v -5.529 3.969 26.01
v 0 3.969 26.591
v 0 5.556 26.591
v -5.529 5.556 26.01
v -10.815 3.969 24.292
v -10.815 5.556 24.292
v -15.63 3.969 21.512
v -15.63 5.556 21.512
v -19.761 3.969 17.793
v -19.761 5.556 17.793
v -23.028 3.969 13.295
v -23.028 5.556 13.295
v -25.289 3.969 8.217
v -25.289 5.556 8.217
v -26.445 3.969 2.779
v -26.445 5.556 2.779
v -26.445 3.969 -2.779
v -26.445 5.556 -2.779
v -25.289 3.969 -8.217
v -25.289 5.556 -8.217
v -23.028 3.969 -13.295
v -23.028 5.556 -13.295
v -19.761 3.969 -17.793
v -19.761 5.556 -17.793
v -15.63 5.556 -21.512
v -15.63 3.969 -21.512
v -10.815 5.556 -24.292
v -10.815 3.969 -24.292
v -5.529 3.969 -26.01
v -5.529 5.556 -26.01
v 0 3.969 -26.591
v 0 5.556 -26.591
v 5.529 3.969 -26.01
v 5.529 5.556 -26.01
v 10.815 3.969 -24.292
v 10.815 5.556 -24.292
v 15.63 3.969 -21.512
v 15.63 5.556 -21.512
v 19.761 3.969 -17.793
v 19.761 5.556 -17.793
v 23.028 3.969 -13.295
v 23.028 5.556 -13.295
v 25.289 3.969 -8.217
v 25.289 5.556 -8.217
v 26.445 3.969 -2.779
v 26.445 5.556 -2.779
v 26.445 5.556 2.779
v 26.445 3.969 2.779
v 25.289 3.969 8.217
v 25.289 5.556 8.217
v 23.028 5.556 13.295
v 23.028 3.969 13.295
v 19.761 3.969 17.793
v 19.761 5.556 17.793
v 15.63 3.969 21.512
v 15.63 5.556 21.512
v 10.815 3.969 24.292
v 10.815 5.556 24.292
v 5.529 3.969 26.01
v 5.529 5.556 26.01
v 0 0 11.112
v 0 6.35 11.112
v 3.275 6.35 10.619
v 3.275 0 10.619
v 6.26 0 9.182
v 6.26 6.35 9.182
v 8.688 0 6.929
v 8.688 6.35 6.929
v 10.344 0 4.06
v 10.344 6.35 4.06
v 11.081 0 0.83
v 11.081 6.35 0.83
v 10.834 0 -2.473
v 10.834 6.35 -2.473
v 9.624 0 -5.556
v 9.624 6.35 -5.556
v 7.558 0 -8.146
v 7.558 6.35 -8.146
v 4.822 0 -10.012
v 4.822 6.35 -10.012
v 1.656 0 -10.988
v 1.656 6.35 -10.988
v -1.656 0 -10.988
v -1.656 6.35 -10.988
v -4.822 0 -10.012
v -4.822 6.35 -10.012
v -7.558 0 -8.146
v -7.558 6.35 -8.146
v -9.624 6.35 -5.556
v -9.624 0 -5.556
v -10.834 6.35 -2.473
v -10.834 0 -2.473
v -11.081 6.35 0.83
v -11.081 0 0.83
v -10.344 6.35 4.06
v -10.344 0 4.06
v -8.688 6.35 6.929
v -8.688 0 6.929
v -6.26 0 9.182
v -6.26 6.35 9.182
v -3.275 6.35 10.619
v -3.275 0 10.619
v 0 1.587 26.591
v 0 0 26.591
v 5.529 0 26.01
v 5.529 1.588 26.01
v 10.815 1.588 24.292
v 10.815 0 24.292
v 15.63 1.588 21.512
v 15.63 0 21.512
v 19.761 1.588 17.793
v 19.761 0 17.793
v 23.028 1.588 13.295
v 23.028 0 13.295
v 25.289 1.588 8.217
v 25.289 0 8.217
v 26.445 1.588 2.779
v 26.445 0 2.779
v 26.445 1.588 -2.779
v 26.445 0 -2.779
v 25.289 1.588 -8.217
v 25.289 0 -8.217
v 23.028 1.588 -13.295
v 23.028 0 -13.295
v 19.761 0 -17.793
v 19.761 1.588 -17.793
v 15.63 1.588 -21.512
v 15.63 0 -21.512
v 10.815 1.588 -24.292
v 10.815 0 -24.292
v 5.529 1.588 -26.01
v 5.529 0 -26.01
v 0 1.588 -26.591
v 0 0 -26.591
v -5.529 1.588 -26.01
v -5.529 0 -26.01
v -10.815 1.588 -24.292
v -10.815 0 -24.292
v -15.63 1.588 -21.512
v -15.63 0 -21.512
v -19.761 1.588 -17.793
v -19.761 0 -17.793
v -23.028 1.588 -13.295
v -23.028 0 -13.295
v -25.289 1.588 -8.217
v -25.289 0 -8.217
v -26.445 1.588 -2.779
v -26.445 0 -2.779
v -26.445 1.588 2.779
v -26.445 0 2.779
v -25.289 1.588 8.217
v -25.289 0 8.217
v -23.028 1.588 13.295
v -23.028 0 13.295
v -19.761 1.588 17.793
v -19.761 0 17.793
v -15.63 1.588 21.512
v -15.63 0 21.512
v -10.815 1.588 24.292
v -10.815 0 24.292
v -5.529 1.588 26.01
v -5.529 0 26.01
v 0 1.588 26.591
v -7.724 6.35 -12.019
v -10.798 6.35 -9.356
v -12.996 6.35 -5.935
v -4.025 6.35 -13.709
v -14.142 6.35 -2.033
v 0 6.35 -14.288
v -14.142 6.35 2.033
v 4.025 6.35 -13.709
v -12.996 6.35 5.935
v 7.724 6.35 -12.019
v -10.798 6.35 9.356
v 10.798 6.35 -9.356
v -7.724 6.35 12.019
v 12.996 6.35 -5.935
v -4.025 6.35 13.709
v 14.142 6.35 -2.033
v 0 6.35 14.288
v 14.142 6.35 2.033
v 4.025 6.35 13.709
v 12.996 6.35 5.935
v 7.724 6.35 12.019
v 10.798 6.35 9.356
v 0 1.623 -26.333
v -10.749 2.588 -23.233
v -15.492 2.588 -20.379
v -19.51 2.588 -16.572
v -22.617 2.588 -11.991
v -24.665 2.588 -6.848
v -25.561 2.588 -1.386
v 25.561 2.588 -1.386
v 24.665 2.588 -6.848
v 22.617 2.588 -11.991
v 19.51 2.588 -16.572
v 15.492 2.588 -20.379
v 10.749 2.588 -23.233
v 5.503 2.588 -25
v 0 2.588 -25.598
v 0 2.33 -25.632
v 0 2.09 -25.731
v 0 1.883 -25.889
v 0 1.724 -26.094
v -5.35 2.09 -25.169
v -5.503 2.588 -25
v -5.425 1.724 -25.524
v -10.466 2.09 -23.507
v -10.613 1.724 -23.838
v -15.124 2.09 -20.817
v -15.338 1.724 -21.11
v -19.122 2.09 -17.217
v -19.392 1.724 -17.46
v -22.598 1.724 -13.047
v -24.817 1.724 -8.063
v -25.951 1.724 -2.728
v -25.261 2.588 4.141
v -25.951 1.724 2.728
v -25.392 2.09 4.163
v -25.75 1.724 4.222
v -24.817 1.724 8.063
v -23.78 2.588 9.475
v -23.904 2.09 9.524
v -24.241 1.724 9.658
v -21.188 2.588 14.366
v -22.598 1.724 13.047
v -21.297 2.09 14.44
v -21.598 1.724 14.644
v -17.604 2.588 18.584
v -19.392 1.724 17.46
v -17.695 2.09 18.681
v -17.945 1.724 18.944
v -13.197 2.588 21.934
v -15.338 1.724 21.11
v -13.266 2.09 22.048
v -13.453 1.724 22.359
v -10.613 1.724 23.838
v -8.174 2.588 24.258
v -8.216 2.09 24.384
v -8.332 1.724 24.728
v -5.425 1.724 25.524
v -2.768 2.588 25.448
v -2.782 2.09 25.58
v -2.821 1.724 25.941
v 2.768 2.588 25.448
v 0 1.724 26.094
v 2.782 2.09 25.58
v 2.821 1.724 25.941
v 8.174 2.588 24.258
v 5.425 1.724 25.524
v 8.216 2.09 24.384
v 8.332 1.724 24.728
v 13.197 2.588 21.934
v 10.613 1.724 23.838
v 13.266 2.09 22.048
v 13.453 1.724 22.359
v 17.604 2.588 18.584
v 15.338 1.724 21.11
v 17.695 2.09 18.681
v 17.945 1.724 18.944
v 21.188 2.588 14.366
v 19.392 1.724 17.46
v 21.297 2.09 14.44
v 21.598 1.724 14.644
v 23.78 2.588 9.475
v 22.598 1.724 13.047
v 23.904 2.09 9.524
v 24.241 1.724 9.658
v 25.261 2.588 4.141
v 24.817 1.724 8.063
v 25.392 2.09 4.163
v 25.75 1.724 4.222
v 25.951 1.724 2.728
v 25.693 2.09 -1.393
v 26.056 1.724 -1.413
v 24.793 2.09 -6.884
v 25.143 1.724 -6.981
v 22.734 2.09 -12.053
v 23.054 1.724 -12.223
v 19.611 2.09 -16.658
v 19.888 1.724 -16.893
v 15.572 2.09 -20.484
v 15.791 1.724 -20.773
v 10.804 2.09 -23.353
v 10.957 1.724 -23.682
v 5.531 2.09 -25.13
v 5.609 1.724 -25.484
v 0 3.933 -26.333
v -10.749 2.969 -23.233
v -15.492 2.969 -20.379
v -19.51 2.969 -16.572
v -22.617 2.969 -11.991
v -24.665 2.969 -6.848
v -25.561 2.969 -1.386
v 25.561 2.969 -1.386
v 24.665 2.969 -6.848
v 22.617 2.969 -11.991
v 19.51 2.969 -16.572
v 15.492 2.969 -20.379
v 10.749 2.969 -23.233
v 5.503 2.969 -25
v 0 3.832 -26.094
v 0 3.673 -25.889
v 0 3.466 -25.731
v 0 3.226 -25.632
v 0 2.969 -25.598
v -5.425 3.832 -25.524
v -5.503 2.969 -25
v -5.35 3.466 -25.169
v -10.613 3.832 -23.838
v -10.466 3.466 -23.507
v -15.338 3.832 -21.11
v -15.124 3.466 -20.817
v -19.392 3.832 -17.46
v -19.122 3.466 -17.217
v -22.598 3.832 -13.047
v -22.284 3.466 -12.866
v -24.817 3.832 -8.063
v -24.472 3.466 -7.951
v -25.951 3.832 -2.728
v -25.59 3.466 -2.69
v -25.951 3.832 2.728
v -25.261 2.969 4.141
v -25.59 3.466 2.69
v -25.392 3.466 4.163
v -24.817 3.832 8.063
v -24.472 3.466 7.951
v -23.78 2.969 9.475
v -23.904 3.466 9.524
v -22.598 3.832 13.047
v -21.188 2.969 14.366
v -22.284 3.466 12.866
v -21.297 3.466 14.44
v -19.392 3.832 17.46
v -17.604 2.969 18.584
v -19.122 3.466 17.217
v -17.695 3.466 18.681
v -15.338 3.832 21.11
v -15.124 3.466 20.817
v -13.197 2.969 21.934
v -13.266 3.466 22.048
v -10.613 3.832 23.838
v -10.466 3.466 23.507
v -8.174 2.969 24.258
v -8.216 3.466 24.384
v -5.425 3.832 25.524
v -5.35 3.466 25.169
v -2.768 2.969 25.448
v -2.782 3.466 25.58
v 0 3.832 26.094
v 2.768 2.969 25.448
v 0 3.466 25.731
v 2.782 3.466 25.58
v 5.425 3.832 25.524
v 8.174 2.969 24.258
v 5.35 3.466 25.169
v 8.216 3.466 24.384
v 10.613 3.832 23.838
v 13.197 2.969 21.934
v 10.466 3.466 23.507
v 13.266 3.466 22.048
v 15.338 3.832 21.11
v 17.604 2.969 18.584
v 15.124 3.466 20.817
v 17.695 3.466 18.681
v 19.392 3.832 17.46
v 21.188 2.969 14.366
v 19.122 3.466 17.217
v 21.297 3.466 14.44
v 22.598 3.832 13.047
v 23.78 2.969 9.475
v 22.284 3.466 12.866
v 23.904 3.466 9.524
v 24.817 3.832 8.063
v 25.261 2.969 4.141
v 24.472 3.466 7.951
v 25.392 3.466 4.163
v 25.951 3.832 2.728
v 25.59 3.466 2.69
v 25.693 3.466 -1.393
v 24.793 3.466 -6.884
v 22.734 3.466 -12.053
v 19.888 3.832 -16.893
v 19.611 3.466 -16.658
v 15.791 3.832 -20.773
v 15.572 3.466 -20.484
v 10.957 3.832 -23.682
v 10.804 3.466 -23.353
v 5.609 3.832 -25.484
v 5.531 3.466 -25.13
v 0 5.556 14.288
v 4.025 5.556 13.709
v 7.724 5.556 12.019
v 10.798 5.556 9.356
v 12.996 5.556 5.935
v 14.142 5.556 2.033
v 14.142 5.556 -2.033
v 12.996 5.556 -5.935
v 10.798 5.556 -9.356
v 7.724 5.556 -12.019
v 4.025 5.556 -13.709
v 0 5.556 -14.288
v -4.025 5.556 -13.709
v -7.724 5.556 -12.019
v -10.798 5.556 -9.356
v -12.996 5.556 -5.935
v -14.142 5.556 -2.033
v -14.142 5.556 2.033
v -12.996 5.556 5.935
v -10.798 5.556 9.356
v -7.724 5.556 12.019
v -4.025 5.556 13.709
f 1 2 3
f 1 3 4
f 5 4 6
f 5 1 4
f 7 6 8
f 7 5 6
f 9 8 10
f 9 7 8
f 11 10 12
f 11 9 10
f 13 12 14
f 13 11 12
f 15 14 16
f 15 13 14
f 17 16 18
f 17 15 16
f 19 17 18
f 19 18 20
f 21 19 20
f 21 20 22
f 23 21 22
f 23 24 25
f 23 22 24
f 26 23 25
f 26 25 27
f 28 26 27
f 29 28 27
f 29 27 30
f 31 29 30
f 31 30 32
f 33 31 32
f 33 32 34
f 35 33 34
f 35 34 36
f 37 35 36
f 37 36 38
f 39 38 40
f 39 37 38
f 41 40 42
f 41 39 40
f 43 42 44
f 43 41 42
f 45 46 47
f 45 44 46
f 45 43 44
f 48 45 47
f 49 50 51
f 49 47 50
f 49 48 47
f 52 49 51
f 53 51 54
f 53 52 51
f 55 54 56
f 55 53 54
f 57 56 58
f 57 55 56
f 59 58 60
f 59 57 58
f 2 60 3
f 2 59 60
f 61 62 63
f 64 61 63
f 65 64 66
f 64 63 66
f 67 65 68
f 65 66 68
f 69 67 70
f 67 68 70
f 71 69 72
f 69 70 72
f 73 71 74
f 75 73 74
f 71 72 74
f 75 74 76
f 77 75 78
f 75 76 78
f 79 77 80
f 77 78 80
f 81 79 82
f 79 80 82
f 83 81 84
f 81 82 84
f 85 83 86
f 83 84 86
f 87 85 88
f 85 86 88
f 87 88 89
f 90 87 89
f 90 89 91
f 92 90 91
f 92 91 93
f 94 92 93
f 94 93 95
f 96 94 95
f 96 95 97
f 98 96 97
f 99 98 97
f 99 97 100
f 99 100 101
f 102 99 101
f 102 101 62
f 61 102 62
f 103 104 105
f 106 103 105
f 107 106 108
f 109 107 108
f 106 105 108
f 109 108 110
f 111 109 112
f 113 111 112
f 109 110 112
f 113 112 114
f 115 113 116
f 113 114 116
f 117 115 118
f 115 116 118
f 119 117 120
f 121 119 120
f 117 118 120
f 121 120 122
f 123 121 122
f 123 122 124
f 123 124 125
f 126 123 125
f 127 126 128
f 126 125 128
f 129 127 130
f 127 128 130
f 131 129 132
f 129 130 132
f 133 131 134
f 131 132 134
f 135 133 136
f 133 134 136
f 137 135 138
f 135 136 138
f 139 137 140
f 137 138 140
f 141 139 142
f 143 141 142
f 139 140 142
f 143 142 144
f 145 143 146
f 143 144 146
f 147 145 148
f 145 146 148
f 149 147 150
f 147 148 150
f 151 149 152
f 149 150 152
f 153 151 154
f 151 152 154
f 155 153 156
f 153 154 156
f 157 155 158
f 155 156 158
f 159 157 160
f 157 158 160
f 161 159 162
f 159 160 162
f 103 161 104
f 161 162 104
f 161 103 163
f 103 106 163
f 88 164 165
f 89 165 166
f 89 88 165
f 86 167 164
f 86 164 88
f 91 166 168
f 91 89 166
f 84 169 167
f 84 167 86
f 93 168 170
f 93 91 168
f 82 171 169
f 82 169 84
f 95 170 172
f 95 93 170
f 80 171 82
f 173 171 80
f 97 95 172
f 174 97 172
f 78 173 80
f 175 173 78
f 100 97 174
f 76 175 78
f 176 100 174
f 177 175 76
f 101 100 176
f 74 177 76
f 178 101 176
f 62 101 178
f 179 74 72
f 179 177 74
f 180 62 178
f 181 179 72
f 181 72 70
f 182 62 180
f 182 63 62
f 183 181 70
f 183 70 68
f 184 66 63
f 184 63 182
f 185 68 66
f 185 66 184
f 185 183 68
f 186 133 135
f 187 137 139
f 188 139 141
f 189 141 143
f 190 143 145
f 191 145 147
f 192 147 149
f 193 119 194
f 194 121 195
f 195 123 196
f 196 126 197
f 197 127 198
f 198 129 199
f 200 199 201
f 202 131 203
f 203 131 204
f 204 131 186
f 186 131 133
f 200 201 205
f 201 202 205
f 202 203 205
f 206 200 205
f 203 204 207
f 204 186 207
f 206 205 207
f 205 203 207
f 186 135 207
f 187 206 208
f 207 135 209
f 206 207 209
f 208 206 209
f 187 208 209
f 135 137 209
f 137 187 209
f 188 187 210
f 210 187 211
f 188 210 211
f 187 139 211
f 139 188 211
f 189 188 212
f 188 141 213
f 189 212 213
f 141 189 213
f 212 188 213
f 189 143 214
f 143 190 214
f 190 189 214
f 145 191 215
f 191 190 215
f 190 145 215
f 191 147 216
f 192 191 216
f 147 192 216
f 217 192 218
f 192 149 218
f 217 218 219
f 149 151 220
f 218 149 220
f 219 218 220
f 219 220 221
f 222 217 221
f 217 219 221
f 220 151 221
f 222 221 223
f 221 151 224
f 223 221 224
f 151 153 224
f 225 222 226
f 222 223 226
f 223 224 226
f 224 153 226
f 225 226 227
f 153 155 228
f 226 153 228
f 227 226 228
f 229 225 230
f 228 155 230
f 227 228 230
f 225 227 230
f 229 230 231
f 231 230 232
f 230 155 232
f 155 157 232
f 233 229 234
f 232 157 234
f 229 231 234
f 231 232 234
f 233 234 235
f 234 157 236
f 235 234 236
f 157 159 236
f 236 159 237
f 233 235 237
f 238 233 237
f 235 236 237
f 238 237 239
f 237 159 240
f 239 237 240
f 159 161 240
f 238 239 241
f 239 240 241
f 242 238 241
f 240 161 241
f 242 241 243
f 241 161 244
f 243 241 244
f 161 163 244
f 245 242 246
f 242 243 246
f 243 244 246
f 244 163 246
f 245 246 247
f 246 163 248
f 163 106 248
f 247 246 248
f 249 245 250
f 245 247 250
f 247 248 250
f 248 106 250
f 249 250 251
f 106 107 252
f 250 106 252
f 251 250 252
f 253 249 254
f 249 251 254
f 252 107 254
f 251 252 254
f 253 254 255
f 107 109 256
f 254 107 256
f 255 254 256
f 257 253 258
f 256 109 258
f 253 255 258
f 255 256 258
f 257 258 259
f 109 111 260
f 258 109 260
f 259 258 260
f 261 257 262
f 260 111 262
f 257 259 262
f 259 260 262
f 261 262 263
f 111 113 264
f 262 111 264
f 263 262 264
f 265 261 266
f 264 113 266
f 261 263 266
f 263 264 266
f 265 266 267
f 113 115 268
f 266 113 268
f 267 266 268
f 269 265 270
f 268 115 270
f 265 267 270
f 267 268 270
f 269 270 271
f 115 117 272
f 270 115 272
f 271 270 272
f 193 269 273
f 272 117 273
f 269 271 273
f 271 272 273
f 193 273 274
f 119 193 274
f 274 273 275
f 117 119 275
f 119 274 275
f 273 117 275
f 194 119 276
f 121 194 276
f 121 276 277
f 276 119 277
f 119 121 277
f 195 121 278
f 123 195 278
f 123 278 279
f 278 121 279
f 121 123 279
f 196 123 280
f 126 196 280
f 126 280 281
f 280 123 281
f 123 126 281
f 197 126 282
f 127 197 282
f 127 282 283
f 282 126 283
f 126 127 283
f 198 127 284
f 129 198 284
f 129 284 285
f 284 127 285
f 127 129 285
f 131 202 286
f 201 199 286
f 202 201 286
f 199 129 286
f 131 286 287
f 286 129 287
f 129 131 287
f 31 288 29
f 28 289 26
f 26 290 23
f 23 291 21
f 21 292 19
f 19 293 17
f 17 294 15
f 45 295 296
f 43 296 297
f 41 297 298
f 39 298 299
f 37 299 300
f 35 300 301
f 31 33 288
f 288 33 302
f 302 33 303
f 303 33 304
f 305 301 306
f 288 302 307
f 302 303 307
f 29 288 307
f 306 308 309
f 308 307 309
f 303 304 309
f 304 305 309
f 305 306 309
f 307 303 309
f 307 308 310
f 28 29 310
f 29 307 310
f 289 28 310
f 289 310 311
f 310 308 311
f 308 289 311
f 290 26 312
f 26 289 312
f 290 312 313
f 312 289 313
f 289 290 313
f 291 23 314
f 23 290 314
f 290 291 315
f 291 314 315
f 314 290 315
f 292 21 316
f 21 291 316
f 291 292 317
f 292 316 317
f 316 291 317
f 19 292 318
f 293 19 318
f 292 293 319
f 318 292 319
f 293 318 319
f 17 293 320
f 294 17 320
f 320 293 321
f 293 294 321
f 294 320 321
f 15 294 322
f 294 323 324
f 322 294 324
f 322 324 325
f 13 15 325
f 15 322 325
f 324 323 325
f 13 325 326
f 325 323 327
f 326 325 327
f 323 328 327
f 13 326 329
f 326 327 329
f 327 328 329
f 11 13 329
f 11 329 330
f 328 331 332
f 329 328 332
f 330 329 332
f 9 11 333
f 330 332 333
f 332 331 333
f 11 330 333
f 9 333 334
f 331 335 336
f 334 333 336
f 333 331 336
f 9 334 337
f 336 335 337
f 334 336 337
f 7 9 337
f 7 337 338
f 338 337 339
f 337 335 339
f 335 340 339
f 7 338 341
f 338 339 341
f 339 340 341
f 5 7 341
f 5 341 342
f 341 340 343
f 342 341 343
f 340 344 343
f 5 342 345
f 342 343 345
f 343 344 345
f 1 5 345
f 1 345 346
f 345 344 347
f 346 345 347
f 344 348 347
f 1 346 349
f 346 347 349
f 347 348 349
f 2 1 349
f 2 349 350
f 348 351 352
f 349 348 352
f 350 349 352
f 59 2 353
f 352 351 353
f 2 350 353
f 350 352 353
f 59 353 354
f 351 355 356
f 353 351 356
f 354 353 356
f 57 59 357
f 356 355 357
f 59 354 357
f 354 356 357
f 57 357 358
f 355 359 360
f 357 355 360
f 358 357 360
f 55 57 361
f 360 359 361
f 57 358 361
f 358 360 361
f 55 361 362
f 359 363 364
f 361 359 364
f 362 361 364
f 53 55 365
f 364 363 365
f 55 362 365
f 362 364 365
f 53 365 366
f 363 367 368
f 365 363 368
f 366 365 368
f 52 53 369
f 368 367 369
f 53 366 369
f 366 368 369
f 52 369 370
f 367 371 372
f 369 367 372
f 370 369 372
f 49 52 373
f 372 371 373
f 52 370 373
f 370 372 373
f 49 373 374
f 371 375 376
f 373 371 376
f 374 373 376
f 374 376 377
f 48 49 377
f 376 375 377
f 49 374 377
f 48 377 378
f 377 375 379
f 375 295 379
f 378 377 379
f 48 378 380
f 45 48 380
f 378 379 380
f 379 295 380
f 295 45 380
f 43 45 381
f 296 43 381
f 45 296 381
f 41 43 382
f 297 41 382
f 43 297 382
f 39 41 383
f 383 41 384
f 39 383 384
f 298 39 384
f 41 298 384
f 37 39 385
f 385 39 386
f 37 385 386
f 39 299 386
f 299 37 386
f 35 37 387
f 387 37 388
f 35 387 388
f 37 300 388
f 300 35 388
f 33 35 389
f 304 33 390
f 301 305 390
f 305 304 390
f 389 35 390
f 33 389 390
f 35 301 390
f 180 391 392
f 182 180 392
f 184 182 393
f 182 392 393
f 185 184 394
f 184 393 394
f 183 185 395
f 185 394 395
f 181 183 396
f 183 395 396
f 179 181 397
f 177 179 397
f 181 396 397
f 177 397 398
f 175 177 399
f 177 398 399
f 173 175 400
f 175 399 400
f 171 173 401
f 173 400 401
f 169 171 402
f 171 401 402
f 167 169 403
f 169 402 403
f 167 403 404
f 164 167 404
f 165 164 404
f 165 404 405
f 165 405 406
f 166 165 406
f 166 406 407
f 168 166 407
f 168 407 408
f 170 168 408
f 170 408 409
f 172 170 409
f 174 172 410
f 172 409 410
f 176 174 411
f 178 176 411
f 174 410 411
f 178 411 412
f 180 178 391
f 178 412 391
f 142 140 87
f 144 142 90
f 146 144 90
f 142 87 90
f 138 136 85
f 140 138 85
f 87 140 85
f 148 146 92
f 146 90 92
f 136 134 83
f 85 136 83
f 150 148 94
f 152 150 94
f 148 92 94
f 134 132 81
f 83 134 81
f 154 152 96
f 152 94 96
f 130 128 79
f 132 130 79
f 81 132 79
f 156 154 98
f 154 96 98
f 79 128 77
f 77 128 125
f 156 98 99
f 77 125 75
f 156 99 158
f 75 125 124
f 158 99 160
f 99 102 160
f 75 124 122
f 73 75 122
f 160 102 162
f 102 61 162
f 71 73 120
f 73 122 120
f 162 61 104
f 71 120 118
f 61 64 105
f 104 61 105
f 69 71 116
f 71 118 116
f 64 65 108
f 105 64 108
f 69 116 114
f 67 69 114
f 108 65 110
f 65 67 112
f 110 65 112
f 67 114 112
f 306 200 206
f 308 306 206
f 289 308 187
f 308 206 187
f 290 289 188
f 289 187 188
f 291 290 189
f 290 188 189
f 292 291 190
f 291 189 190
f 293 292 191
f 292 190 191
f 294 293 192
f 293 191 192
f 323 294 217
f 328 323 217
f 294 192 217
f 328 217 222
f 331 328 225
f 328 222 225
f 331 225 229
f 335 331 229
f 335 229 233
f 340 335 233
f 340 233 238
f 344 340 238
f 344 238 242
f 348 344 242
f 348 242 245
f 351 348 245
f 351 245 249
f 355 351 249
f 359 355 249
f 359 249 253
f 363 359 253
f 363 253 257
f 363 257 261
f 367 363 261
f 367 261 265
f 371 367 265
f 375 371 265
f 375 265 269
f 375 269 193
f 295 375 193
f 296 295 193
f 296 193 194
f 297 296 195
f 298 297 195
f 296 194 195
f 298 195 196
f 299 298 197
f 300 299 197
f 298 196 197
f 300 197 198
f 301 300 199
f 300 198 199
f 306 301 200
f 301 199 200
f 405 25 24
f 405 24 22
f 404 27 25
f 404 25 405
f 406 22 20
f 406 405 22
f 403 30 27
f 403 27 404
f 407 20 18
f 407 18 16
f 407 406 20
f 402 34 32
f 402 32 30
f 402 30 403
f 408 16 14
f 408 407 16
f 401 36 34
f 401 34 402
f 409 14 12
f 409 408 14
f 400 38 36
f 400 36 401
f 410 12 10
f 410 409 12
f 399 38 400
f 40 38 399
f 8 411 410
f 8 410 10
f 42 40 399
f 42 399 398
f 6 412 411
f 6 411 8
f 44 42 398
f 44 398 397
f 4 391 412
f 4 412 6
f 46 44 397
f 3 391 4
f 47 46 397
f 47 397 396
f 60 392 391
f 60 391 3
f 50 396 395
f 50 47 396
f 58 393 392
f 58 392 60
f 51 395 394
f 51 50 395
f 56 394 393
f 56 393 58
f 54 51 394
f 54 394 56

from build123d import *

# Parameters (mm, degrees)
SKETCH1_R           = 26.590625
BOSS_EXTRUDE1_DEPTH = 1.5875
SKETCH2_R           = 25.5984375
BOSS_EXTRUDE2_DEPTH = 2.38125
SKETCH3_R           = 26.590625
BOSS_EXTRUDE3_DEPTH = 1.5875
SKETCH5_R           = 14.2875
BOSS_EXTRUDE4_DEPTH = 0.79375
SKETCH6_R           = 11.1125
CUT_EXTRUDE1_DEPTH  = 39.137188881
FILLET1_R           = 1
FILLET2_R           = 1


with BuildPart() as part:
    # Sketch1 → Boss-Extrude1 (new body)
    with BuildSketch(Plane(origin=(0, 0, 0), x_dir=(1, 0, 0), z_dir=(0, 1, 0))):
        with Locations(Location((0, 0, 0), (0, 0, 270))):
            Circle(SKETCH1_R)
    extrude(amount=BOSS_EXTRUDE1_DEPTH)

    # Sketch2 → Boss-Extrude2 (add)
    with BuildSketch(Plane(origin=(0, 1.5875, 0), x_dir=(1, 0, 0), z_dir=(0, 1, 0))):
        with Locations(Location((0, 0, 0), (0, 0, 90))):
            Circle(SKETCH2_R)
    extrude(amount=BOSS_EXTRUDE2_DEPTH)

    # Sketch3 → Boss-Extrude3 (add)
    with BuildSketch(Plane(origin=(0, 3.96875, 0), x_dir=(1, 0, 0), z_dir=(0, 1, 0))):
        with Locations(Location((0, 0, 0), (0, 0, 270))):
            Circle(SKETCH3_R)
    extrude(amount=BOSS_EXTRUDE3_DEPTH)

    # Sketch5 → Boss-Extrude4 (add)
    with BuildSketch(Plane(origin=(0, 5.55625, 0), x_dir=(1, 0, 0), z_dir=(0, 1, 0))):
        with Locations(Location((0, 0, 0), (0, 0, 270))):
            Circle(SKETCH5_R)
    extrude(amount=BOSS_EXTRUDE4_DEPTH)

    # Sketch6 → Cut-Extrude1 (cut, through all)
    with BuildSketch(Plane(origin=(0, 6.35, 0), x_dir=(1, 0, 0), z_dir=(0, 1, 0))):
        with Locations(Location((0, 0, 0), (0, 0, 270))):
            Circle(SKETCH6_R)
    extrude(amount=-CUT_EXTRUDE1_DEPTH, mode=Mode.SUBTRACT)

    # Fillet1
    # the kernel refuses this fillet: 1 mm, written as the material it adds along each edge
    with BuildSketch(Plane(origin=(0, 1.5875, 0), x_dir=(0, 0, -1), z_dir=(1, 0, 0))) as fillet1_piece_1_section:
        with BuildLine():
            CenterArc((25.5984375 + FILLET1_R, FILLET1_R), FILLET1_R, 180, 90)
            Line((25.5984375 + FILLET1_R, 0), (25.5984375, 0))
            Line((25.5984375, 0), (25.5984375, FILLET1_R))
        make_face()
    fillet1_piece_1 = revolve(axis=Axis((0, 1.5875, 0), (0, 1, 0)), mode=Mode.PRIVATE)
    fillet1_piece_1 = fillet1_piece_1 & Plane(origin=(0, 1.858804506, 0), x_dir=(0, 0, 1), z_dir=(0, -1, 0)) * Cylinder(26.590625, 107, mode=Mode.PRIVATE)
    add(fillet1_piece_1)

    # Fillet2
    # the kernel refuses this fillet: 1 mm, written as the material it adds along each edge
    with BuildSketch(Plane(origin=(0, 3.96875, 0), x_dir=(0, 0, -1), z_dir=(1, 0, 0))) as fillet2_piece_1_section:
        with BuildLine():
            CenterArc((25.5984375 + FILLET2_R, -FILLET2_R), FILLET2_R, 90, 90)
            Line((25.5984375 + FILLET2_R, 0), (25.5984375, 0))
            Line((25.5984375, 0), (25.5984375, -FILLET2_R))
        make_face()
    fillet2_piece_1 = revolve(axis=Axis((0, 3.96875, 0), (0, 1, 0)), mode=Mode.PRIVATE)
    fillet2_piece_1 = fillet2_piece_1 & Plane(origin=(0, 3.697445494, 0), x_dir=(0, 0, 1), z_dir=(0, -1, 0)) * Cylinder(26.590625, 107, mode=Mode.PRIVATE)
    add(fillet2_piece_1)


solid = part.part
